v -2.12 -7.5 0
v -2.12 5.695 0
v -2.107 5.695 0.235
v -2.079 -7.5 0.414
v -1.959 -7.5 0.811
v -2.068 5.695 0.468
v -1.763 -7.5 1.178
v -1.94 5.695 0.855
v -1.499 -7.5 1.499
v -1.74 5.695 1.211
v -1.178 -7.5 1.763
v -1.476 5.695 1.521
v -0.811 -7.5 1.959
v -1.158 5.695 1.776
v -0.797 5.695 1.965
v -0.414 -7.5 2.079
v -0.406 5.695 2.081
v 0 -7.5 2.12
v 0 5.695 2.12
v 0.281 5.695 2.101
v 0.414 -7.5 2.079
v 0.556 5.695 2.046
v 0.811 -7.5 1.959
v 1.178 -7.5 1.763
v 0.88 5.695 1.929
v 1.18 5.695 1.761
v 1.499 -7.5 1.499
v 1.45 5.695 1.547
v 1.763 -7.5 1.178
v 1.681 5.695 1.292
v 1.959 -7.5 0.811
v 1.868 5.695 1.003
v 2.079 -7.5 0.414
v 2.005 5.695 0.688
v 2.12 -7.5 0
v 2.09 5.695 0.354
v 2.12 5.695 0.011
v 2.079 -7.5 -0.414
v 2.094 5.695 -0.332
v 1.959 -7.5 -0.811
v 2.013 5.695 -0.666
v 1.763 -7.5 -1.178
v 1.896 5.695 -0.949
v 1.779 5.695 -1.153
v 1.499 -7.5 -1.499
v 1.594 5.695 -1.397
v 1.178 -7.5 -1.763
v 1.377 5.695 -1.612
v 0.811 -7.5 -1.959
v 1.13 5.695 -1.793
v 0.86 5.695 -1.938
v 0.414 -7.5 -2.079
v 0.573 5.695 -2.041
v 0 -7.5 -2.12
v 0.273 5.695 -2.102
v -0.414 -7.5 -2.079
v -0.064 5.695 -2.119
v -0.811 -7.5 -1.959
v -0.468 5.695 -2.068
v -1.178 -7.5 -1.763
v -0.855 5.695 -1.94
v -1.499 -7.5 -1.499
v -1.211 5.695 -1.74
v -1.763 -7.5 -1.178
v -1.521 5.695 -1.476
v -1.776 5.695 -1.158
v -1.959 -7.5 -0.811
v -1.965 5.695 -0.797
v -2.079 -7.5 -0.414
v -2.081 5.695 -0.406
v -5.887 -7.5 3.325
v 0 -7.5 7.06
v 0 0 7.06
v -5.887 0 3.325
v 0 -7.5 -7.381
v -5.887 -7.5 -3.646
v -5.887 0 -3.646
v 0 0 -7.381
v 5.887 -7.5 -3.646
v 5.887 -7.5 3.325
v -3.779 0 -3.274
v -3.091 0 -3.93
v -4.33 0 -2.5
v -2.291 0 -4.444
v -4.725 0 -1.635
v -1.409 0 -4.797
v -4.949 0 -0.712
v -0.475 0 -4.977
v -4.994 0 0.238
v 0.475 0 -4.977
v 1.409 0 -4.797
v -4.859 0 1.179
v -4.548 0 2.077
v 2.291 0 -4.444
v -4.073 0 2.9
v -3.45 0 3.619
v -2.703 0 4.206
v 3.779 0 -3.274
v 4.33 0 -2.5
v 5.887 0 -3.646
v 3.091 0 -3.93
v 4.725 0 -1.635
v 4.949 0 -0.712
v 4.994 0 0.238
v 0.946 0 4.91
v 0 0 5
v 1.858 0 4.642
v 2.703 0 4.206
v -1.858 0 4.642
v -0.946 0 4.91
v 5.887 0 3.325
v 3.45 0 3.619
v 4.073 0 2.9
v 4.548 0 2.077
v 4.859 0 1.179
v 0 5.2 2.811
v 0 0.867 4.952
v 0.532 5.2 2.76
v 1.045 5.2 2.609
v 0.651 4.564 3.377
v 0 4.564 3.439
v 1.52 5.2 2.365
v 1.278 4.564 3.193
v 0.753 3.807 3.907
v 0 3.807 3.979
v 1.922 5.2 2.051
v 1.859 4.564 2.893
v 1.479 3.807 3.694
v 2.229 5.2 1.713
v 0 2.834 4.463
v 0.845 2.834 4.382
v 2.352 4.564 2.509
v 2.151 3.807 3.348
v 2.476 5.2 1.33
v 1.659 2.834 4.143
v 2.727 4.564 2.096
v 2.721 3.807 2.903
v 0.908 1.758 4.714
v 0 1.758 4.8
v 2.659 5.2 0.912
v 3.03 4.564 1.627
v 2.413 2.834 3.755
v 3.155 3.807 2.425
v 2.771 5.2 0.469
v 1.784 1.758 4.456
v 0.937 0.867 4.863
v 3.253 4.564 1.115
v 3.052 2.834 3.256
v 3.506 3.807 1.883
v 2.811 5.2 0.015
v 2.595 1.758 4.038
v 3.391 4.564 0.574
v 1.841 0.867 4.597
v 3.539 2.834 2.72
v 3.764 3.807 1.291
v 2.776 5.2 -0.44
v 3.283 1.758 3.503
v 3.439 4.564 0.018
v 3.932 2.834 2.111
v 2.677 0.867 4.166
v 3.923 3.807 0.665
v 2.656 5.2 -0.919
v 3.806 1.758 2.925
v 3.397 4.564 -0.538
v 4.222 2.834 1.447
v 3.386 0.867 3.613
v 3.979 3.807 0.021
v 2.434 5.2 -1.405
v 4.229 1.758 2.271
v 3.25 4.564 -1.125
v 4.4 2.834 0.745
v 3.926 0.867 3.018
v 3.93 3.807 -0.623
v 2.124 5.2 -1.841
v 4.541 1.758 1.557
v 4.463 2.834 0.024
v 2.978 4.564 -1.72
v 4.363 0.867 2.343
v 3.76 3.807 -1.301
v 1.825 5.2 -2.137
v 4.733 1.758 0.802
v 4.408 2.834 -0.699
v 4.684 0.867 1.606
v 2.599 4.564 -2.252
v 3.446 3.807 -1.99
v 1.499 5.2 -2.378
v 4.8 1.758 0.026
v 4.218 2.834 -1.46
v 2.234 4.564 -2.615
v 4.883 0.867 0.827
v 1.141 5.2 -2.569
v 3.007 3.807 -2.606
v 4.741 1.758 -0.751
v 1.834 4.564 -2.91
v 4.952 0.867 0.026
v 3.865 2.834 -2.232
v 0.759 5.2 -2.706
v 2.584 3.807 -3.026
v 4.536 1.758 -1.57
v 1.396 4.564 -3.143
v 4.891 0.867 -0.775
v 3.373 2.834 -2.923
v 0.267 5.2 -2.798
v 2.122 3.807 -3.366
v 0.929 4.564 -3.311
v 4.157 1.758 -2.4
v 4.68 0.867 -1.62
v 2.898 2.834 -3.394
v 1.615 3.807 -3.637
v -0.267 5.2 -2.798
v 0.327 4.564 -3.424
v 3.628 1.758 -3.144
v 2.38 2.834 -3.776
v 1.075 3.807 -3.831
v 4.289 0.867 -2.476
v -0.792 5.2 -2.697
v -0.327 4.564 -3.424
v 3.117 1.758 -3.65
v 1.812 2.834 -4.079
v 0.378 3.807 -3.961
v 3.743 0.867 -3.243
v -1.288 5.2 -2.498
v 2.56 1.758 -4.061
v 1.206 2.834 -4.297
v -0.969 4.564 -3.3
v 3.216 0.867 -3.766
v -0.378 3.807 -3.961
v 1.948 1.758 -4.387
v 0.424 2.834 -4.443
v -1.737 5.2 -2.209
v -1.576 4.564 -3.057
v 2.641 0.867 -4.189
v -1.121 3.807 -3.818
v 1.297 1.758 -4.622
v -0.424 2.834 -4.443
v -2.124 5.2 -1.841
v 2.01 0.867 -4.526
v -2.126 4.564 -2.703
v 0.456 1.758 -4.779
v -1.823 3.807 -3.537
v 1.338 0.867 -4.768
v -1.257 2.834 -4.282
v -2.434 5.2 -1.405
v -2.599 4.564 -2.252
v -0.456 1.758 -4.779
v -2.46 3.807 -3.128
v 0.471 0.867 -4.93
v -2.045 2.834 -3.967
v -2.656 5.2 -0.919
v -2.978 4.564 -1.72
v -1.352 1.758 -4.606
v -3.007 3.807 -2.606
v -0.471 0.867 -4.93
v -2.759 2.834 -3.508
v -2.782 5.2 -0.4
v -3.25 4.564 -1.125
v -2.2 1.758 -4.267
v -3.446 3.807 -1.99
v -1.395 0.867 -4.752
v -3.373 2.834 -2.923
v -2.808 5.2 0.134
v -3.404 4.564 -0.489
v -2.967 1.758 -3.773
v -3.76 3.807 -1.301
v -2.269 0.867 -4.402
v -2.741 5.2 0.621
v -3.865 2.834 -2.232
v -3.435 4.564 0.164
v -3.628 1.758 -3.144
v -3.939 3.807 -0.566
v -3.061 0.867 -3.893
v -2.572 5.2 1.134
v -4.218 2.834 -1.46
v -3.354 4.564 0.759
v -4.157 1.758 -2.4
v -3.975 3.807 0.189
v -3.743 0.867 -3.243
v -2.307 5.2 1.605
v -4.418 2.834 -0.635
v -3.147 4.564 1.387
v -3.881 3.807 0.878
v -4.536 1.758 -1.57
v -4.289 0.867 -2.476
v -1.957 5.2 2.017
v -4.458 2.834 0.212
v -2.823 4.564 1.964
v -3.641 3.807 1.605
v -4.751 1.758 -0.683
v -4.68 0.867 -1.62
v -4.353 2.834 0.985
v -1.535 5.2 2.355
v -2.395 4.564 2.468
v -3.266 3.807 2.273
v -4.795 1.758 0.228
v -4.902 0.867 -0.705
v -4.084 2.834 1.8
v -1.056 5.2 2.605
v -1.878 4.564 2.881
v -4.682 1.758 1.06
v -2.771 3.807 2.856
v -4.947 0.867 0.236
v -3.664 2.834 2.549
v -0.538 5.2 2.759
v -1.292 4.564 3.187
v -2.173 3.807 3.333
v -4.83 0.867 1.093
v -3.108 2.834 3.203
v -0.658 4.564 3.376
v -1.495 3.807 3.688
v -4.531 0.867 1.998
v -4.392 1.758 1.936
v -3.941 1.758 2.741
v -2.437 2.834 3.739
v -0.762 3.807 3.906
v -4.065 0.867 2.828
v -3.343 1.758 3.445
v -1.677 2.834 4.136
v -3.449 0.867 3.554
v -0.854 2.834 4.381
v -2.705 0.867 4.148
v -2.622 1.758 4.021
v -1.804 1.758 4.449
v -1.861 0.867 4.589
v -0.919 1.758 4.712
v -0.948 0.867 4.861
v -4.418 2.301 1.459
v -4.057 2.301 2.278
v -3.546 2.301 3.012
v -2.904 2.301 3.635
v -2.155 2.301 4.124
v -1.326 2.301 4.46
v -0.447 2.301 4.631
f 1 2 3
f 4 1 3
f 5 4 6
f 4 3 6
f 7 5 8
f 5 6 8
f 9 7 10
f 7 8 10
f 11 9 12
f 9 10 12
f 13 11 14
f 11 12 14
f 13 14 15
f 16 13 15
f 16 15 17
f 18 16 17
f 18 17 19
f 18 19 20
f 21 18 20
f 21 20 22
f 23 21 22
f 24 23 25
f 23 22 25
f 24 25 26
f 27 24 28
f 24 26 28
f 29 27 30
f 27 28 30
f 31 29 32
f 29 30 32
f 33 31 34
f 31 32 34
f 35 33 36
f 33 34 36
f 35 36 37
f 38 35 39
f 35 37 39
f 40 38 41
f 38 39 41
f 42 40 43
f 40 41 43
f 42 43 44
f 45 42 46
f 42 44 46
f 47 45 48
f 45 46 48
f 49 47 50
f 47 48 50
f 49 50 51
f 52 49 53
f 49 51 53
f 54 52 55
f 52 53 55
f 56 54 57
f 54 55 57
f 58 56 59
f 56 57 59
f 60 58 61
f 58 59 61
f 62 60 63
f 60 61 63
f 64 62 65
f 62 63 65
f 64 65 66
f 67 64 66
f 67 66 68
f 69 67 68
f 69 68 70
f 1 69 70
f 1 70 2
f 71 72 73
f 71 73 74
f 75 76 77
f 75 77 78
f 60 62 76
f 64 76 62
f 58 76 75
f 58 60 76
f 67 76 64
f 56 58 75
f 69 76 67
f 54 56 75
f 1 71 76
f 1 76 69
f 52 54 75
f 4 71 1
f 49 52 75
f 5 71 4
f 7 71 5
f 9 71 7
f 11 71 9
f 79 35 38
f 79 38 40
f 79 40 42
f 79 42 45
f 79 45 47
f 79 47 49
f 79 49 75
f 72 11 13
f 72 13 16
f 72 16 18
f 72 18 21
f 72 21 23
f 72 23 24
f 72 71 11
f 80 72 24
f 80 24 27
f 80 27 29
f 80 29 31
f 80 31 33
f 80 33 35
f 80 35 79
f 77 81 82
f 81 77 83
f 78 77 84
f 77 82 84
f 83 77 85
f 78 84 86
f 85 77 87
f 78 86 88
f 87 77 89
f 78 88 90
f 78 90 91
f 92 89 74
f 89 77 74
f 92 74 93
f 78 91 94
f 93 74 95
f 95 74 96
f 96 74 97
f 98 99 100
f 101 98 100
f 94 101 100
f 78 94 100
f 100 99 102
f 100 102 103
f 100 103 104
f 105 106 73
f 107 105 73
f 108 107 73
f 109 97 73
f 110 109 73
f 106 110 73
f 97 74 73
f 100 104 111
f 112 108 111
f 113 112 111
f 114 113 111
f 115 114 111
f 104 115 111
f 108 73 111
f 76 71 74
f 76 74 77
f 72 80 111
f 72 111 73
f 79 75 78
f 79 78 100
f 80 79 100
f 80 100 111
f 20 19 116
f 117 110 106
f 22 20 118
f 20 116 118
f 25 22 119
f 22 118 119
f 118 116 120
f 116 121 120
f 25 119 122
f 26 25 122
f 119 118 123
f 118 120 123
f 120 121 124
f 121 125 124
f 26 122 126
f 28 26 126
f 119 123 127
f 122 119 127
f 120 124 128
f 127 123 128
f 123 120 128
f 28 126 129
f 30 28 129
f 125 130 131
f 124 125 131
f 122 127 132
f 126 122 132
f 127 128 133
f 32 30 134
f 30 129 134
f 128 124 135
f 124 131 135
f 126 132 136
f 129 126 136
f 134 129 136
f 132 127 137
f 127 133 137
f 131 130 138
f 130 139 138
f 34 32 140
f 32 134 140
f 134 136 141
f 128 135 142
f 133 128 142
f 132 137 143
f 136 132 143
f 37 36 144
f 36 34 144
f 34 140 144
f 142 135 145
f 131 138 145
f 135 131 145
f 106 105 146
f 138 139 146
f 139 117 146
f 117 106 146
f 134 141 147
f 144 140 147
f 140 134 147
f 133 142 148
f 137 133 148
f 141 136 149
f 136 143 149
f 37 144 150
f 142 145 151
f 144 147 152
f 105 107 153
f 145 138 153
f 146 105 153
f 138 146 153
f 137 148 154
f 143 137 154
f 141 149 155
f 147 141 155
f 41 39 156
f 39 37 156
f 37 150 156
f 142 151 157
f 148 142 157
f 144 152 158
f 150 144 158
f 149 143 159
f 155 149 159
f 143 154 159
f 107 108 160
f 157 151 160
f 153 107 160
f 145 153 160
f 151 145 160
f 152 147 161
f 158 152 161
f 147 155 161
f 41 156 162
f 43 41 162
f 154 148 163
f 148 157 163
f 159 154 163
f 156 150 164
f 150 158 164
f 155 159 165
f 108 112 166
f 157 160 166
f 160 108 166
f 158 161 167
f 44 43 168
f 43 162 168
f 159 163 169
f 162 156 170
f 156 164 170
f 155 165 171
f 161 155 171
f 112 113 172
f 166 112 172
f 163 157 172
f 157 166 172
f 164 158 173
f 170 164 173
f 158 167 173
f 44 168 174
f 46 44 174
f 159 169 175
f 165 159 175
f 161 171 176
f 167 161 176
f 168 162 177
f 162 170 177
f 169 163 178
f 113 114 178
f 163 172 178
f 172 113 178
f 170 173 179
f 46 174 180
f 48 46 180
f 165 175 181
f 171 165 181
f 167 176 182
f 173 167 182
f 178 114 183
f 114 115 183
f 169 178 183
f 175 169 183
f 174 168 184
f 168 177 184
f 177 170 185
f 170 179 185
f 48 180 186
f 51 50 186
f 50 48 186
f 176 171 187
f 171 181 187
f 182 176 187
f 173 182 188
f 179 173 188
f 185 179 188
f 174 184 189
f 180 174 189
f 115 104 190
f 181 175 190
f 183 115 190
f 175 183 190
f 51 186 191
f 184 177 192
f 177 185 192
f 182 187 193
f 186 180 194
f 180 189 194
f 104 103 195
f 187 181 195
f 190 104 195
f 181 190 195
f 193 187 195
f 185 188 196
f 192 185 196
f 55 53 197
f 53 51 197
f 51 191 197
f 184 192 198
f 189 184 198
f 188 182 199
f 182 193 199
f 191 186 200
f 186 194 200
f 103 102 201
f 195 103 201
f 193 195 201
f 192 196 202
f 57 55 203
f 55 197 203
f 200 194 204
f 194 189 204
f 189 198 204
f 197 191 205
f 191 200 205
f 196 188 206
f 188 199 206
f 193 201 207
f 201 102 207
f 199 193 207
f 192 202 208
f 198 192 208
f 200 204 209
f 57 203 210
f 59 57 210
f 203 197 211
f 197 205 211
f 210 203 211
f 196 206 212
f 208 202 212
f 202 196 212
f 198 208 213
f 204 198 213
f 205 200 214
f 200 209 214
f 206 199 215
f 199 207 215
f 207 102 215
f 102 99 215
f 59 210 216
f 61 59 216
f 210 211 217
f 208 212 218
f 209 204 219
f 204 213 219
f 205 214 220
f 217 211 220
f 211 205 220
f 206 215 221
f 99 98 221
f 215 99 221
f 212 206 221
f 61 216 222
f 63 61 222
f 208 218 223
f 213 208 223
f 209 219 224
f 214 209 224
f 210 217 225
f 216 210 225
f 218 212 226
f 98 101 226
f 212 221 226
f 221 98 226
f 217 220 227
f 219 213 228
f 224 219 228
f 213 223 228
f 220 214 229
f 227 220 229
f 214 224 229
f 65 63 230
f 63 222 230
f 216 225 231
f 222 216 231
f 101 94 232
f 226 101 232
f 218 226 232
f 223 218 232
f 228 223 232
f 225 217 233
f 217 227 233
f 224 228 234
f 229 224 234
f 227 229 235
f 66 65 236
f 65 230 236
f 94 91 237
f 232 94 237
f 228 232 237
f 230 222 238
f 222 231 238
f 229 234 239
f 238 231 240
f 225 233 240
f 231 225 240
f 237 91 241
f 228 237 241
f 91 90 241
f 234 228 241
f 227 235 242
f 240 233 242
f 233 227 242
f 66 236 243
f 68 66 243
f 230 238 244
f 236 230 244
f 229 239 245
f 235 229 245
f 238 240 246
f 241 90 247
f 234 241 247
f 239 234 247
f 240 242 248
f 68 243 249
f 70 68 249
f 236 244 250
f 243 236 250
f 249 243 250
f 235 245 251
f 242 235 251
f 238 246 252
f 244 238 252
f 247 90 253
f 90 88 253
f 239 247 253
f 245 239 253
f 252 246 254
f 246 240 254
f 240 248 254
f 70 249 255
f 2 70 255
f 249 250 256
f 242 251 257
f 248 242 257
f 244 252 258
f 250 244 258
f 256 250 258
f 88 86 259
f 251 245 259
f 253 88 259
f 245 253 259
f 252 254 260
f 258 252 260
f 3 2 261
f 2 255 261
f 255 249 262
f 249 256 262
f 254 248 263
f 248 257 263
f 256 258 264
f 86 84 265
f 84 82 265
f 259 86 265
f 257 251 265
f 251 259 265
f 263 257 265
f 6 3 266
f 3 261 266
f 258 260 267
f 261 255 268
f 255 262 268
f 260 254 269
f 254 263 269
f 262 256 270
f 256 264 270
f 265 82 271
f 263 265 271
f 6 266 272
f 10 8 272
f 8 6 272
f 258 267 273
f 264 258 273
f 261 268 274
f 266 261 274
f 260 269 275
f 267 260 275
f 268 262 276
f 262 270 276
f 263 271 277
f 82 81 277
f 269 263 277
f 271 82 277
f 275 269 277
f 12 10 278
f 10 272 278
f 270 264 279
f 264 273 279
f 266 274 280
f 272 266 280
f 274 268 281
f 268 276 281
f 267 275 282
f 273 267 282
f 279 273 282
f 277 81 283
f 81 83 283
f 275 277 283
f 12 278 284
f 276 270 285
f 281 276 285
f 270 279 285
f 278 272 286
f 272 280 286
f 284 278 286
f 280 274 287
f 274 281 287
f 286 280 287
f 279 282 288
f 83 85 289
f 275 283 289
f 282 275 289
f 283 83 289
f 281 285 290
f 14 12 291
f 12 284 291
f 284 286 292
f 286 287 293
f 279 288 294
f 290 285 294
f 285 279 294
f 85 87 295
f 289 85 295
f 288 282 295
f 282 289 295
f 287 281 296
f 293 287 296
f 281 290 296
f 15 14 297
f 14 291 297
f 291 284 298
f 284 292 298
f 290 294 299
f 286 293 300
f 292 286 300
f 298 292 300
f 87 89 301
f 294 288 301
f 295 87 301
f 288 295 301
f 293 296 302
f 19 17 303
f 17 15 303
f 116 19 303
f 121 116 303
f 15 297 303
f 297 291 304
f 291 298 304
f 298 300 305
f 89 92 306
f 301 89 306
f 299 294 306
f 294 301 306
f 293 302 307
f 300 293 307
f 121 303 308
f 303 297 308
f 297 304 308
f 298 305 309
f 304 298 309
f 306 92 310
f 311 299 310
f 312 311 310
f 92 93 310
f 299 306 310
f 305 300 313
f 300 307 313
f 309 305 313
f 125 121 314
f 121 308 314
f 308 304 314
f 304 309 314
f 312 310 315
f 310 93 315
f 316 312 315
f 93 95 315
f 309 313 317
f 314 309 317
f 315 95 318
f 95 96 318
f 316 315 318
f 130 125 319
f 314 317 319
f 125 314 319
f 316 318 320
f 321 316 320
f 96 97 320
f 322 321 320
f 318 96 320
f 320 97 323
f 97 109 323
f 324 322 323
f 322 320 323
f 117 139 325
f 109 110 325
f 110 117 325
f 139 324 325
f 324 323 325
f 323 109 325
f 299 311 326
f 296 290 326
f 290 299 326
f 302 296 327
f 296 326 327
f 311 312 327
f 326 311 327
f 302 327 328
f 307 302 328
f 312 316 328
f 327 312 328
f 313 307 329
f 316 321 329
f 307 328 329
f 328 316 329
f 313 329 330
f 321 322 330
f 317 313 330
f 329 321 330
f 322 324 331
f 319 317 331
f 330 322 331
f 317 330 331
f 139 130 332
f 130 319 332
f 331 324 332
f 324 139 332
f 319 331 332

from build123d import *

# Parameters (mm, degrees)
F1_DEPTH = 7.5
F6_D     = 4.24


with BuildPart() as f4:
    # F0 (on Right) → F4 (revolve)
    with BuildSketch(Plane.YZ):
        with BuildLine():
            Line((-7.5, 0), (0, 0))
            Line((0, 0), (6.288552845, 0))
            add(Edge.make_bspline(
                [(6.288552845, 0), (6.2874522314, 4.9991249071), (0, 5)],
                knots=[0.0004759058, 0.0004759058, 0.0004759058, 1.5710971834, 1.5710971834, 1.5710971834], degree=2, weights=[1, 0.7071686677, 1]))
            Line((0, 5), (-0.0011008063, 5))
            Line((-0.0011008063, 5), (-7.5, 5))
            Line((-7.5, 5), (-7.5, 0))
        make_face()
    revolve(axis=Axis((0, -3.8328841329, 0), (0, 1, 0)))

    # F5 (on face) → F1 (join)
    with BuildSketch(Plane.XZ.offset(7.5)):
        Polygon((5.8867447078, 3.3254646696), (0, 7.0603471249), (-5.8867447078, 3.3254646696), (-5.8867447078, -3.6461284202), (0, -7.3810108755), (5.8867447078, -3.6461284202), align=None)
    extrude(amount=-F1_DEPTH)

    # F6 (through all)
    with Locations(Plane.XZ.offset(7.5)):
        with Locations((0, 0)):
            Hole(F6_D / 2)


solid = f4.part
